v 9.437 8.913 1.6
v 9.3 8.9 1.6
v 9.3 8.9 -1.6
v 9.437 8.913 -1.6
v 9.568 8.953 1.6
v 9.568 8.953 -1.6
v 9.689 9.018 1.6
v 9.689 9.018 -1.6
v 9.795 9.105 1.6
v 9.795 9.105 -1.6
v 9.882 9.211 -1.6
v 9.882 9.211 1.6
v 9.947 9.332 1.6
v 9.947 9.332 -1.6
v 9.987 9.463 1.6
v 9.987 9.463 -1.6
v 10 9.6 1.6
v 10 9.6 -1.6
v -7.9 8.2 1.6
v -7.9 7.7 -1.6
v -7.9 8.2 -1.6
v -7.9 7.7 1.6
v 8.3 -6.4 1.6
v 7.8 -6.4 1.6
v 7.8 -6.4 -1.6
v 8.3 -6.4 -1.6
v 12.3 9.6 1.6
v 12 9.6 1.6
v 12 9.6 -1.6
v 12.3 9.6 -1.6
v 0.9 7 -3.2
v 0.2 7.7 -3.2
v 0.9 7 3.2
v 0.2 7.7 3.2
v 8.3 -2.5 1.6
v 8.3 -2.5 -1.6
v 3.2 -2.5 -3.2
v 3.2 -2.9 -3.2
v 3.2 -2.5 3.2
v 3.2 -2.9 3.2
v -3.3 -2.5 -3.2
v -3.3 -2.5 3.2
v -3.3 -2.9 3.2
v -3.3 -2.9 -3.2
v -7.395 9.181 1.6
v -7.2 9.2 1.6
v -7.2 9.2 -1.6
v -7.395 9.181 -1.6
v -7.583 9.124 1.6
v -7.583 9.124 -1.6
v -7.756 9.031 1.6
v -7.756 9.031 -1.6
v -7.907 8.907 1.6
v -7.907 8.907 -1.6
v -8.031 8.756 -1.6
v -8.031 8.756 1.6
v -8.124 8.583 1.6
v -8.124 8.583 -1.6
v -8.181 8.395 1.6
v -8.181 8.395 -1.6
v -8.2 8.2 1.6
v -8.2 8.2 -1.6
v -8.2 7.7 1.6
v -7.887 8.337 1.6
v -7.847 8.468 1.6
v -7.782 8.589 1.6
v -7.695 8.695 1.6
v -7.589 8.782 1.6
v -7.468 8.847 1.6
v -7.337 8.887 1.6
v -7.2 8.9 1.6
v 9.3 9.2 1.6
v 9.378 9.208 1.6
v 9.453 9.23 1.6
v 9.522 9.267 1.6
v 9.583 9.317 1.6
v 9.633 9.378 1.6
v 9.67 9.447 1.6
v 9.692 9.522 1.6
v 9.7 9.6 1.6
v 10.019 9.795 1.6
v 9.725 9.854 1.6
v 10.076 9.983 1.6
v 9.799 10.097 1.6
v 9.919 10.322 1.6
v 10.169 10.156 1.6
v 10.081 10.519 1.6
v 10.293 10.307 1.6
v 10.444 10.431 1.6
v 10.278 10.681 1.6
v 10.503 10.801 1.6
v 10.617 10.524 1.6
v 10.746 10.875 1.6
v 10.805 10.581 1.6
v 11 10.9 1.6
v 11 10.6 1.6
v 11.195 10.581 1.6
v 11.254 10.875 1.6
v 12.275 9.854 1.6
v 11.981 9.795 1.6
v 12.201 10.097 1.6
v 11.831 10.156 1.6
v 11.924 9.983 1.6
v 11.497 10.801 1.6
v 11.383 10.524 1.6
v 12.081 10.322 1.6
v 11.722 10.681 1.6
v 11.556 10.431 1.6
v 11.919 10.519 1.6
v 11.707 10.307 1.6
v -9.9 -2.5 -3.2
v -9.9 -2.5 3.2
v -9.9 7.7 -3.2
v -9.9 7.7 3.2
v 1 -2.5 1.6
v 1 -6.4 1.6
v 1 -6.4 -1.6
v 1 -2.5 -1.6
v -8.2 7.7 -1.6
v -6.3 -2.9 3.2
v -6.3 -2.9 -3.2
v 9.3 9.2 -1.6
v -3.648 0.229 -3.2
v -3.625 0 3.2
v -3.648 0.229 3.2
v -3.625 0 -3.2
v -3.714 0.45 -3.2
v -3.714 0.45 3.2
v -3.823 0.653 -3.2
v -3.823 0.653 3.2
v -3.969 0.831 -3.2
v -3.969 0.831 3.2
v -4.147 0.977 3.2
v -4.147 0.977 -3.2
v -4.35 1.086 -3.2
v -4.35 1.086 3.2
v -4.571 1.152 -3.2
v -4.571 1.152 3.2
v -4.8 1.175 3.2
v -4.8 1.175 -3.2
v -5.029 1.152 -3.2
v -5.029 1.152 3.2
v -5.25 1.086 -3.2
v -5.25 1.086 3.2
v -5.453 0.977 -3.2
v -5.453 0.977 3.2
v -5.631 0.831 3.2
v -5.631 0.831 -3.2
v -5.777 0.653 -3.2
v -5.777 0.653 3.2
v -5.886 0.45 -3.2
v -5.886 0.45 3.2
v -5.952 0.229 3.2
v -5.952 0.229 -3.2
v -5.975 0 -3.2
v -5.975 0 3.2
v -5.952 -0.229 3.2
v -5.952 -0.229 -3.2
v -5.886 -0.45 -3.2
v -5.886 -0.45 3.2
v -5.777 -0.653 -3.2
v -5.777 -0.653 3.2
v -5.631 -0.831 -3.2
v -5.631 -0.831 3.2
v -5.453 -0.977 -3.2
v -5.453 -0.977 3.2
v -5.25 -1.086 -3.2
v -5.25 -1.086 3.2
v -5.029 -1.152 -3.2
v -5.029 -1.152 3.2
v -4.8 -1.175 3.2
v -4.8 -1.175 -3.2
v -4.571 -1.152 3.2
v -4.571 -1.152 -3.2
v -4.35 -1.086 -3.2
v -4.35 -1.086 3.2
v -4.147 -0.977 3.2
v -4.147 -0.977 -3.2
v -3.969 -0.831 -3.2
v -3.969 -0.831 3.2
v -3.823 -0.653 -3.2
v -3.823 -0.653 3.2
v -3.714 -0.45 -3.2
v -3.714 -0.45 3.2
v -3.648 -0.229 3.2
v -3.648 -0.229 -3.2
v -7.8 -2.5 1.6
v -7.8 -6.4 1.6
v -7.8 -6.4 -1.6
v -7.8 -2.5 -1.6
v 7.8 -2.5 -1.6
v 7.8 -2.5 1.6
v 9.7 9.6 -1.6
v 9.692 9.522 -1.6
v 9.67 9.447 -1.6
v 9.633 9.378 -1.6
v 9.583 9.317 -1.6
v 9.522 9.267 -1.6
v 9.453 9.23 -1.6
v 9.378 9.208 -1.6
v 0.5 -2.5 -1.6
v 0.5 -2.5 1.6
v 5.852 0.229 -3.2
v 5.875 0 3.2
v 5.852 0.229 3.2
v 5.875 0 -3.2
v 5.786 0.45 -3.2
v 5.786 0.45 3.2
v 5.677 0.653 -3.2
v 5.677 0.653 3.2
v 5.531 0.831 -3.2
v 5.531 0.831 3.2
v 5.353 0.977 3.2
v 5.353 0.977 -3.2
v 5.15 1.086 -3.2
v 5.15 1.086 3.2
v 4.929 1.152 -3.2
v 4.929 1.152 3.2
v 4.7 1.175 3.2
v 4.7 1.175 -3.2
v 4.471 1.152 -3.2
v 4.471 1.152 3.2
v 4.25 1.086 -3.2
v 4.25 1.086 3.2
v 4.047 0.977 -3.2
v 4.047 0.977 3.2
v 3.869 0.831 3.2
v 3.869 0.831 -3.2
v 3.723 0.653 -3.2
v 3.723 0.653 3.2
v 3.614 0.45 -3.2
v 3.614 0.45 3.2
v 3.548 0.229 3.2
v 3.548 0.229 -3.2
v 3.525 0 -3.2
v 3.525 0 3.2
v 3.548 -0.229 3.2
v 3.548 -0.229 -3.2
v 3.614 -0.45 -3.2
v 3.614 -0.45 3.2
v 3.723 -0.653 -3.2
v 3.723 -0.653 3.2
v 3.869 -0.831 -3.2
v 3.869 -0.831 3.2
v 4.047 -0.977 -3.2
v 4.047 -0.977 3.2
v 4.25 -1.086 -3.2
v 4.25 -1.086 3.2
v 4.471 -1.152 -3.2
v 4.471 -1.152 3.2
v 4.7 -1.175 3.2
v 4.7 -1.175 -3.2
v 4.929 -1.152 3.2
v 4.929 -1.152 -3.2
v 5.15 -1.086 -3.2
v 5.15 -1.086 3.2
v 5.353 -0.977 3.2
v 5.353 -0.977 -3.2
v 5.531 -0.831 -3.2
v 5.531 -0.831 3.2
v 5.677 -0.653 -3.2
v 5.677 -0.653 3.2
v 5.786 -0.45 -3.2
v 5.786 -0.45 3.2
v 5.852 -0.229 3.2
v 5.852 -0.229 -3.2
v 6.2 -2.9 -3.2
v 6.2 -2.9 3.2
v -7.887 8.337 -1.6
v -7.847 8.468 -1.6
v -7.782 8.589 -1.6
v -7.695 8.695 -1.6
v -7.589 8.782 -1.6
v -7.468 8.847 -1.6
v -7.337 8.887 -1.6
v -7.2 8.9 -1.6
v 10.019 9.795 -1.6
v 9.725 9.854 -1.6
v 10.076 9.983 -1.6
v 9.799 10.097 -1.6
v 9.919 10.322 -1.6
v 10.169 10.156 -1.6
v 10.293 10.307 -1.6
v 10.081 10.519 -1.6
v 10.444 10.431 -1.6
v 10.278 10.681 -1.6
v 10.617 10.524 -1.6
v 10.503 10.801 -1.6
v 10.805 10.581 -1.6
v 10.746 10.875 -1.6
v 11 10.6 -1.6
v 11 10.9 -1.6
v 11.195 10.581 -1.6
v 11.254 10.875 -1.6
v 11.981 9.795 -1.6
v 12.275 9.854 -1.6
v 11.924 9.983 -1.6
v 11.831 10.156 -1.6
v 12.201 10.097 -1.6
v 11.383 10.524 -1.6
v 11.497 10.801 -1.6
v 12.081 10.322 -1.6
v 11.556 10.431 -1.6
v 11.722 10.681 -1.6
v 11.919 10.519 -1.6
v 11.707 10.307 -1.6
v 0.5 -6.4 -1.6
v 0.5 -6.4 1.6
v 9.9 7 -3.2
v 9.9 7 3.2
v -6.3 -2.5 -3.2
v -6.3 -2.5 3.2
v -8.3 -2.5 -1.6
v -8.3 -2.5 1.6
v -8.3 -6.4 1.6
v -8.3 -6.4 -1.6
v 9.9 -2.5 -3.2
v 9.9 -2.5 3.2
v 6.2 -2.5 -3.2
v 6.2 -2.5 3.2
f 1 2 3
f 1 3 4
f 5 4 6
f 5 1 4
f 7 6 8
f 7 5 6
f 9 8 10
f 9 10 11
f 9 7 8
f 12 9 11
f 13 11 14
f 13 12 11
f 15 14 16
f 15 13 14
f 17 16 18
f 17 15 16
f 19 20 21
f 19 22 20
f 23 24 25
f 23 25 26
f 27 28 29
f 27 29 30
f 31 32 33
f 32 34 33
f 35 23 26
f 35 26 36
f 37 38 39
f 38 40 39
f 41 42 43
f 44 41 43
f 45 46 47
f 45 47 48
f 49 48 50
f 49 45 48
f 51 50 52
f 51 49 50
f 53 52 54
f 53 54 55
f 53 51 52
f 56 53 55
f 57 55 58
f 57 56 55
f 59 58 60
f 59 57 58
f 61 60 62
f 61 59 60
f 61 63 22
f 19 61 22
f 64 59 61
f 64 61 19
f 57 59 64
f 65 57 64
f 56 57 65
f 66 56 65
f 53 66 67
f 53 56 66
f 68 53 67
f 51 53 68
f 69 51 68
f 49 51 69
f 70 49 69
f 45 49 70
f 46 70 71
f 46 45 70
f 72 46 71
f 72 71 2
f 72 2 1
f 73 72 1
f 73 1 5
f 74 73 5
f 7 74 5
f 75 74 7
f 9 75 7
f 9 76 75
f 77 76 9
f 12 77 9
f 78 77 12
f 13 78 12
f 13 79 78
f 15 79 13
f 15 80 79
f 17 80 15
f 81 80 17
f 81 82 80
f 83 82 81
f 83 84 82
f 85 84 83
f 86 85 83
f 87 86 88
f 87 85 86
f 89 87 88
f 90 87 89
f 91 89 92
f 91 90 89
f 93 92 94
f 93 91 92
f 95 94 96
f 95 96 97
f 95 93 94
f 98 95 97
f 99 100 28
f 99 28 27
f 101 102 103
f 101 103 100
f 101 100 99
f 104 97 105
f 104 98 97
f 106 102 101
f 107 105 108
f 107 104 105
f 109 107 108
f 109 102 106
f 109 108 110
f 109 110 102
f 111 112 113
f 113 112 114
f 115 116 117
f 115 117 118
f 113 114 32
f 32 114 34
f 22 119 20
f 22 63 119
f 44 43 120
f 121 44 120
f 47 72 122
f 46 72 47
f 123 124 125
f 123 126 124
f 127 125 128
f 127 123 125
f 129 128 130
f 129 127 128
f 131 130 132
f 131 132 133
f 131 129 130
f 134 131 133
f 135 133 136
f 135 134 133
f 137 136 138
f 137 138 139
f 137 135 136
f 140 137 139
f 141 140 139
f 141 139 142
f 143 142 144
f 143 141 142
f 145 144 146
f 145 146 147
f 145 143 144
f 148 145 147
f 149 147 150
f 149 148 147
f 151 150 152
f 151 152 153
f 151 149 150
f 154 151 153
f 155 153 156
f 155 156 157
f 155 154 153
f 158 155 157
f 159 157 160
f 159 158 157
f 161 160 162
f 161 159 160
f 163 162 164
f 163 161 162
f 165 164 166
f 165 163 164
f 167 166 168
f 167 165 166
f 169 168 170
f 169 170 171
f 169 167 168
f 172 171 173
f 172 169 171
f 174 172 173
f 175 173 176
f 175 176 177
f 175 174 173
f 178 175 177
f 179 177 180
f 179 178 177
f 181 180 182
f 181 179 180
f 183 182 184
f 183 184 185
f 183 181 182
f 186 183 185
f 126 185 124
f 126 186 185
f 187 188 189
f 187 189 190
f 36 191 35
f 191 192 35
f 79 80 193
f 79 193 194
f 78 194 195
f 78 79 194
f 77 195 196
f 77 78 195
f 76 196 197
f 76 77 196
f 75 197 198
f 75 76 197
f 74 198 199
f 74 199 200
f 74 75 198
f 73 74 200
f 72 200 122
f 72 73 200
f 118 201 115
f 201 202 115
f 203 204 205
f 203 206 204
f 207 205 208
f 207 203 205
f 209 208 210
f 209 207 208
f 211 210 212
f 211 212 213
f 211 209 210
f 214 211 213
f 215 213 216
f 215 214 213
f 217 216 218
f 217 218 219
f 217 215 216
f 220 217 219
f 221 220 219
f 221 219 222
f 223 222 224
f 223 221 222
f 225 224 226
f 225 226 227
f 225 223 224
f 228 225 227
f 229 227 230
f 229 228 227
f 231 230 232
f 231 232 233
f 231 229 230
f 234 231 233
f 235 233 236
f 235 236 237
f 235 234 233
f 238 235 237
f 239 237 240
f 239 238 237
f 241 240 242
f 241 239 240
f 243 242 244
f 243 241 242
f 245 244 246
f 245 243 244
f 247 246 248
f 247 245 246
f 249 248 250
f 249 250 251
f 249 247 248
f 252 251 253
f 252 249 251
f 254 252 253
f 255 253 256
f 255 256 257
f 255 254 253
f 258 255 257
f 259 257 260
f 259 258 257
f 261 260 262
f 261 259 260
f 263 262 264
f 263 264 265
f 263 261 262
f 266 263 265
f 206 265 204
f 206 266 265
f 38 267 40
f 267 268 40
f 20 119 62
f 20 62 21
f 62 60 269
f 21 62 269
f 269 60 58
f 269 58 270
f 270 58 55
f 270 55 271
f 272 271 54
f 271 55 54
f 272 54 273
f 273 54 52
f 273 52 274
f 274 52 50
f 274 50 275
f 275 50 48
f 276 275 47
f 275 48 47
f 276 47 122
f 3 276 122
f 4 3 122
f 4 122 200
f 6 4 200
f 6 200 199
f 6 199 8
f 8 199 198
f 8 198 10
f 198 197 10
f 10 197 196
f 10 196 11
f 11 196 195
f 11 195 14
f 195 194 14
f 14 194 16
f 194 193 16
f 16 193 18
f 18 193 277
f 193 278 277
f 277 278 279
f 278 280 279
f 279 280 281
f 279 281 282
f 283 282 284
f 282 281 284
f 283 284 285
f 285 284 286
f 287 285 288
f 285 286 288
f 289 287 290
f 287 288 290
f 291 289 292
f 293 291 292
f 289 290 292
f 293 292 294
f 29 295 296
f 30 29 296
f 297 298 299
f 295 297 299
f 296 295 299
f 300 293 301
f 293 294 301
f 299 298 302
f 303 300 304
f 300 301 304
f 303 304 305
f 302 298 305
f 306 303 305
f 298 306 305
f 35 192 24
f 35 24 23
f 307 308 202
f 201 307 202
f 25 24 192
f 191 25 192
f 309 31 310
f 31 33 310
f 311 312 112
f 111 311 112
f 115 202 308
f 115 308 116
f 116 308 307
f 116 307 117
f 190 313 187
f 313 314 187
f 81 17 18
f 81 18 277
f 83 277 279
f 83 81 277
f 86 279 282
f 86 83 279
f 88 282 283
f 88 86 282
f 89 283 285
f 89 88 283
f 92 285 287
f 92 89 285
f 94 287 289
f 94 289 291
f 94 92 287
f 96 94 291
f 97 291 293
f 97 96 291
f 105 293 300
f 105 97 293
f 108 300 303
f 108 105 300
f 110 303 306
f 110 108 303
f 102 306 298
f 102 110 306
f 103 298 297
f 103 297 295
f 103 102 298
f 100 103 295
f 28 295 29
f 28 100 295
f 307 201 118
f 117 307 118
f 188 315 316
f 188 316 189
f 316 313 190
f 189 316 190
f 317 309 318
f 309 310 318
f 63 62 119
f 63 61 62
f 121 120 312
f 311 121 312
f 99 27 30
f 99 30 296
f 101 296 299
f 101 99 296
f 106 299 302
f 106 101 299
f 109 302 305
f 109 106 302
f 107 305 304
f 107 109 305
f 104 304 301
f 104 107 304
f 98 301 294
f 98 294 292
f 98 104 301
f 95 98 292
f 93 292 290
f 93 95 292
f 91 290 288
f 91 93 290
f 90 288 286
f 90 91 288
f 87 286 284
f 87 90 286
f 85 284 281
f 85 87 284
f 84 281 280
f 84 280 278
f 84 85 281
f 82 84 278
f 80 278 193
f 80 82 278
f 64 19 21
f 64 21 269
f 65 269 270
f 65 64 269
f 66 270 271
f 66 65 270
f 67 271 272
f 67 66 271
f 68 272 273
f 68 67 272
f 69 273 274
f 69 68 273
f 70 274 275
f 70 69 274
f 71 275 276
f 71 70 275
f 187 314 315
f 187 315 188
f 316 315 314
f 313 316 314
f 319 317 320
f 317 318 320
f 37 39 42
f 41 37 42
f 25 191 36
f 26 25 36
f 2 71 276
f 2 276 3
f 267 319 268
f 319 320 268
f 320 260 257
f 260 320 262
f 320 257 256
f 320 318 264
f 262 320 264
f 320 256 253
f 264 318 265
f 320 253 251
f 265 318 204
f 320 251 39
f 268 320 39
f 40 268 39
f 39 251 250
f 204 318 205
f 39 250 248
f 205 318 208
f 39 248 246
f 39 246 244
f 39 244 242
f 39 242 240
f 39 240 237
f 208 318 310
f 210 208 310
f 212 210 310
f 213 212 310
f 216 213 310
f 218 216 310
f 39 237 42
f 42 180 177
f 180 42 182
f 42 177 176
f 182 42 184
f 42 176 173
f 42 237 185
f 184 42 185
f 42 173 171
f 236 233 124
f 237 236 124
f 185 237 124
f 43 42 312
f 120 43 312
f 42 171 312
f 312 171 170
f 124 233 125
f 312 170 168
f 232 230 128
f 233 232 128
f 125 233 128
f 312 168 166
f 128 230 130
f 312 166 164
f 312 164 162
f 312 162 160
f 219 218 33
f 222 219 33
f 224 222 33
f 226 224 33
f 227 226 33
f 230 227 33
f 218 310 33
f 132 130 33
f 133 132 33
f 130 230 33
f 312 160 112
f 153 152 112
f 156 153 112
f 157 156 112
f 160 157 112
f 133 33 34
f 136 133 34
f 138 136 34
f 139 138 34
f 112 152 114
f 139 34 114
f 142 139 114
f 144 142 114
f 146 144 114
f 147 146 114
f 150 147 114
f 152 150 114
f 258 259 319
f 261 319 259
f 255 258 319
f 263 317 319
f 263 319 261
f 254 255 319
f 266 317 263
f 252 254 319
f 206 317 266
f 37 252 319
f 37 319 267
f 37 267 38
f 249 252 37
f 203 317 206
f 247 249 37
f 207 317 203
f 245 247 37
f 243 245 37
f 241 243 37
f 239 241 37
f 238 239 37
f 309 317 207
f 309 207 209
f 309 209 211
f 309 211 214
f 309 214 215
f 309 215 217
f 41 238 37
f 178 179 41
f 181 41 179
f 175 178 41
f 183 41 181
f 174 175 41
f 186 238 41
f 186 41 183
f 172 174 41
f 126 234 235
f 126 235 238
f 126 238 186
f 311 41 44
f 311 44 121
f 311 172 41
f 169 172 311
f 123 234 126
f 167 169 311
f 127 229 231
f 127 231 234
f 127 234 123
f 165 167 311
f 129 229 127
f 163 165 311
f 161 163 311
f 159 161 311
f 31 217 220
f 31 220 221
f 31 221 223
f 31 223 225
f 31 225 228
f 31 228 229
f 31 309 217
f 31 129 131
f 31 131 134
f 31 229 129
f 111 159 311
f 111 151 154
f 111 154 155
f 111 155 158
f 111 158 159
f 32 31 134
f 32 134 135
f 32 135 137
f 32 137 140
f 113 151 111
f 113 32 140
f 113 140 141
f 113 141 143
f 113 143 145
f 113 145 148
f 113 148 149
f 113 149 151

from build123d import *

# Parameters (mm, degrees)
SKETCH1_R             = 1.175
BOSS_EXTRUDE1_DEPTH   = 3.2
SKETCH2_W             = 0.5
SKETCH2_H             = 3.9
BOSS_EXTRUDE2_DEPTH   = 1.6
BOSS_EXTRUDE2_2_DEPTH = 1.6
BOSS_EXTRUDE2_3_DEPTH = 1.6
EXTRUDE_THIN1_DEPTH   = 1.6


with BuildPart() as part:
    # Sketch1 → Boss-Extrude1 (new, symmetric)
    with BuildSketch(Plane.XY):
        Polygon((-9.9, 7.7), (0.2, 7.7), (0.9, 7), (9.9, 7), (9.9, -2.5), (6.2, -2.5), (6.2, -2.9), (3.2, -2.9), (3.2, -2.5), (-3.3, -2.5), (-3.3, -2.9), (-6.3, -2.9), (-6.3, -2.5), (-9.9, -2.5), align=None)
        with Locations((-4.8, 0)):
            Circle(SKETCH1_R, mode=Mode.SUBTRACT)
        with Locations((4.7, 0)):
            Circle(SKETCH1_R, mode=Mode.SUBTRACT)
    extrude(amount=BOSS_EXTRUDE1_DEPTH, both=True)


with BuildPart() as body_2:
    # Sketch2 → Boss-Extrude2 (new, symmetric)
    with BuildSketch(Plane.XY):
        with Locations((-8.05, -4.45)):
            Rectangle(SKETCH2_W, SKETCH2_H)
    extrude(amount=BOSS_EXTRUDE2_DEPTH, both=True)


with BuildPart() as body_3:
    # Sketch2 → Boss-Extrude2 2 (new, symmetric)
    with BuildSketch(Plane.XY):
        with Locations((0.75, -4.45)):
            Rectangle(SKETCH2_W, SKETCH2_H)
    extrude(amount=BOSS_EXTRUDE2_2_DEPTH, both=True)


with BuildPart() as body_4:
    # Sketch2 → Boss-Extrude2 3 (new, symmetric)
    with BuildSketch(Plane.XY):
        with Locations((8.05, -4.45)):
            Rectangle(SKETCH2_W, SKETCH2_H)
    extrude(amount=BOSS_EXTRUDE2_3_DEPTH, both=True)


with BuildPart() as body_5:
    # Sketch3 → Extrude-Thin1 (new, symmetric)
    with BuildSketch(Plane.XY):
        with BuildLine():
            Line((-7.9, 7.7), (-7.9, 8.2))
            ThreePointArc((-7.9, 8.2), (-7.694974747, 8.694974747), (-7.2, 8.9))
            Line((-7.2, 8.9), (9.3, 8.9))
            ThreePointArc((9.3, 8.9), (9.794974747, 9.105025253), (10, 9.6))
            ThreePointArc((10, 9.6), (11, 10.6), (12, 9.6))
            Line((12, 9.6), (12.3, 9.6))
            ThreePointArc((12.3, 9.6), (11, 10.9), (9.7, 9.6))
            ThreePointArc((9.7, 9.6), (9.582842712, 9.317157288), (9.3, 9.2))
            Line((9.3, 9.2), (-7.2, 9.2))
            ThreePointArc((-7.2, 9.2), (-7.907106781, 8.907106781), (-8.2, 8.2))
            Line((-8.2, 8.2), (-8.2, 7.7))
            Line((-8.2, 7.7), (-7.9, 7.7))
        make_face()
    extrude(amount=EXTRUDE_THIN1_DEPTH, both=True)


solid = Compound([part.part, body_2.part, body_3.part, body_4.part, body_5.part])
